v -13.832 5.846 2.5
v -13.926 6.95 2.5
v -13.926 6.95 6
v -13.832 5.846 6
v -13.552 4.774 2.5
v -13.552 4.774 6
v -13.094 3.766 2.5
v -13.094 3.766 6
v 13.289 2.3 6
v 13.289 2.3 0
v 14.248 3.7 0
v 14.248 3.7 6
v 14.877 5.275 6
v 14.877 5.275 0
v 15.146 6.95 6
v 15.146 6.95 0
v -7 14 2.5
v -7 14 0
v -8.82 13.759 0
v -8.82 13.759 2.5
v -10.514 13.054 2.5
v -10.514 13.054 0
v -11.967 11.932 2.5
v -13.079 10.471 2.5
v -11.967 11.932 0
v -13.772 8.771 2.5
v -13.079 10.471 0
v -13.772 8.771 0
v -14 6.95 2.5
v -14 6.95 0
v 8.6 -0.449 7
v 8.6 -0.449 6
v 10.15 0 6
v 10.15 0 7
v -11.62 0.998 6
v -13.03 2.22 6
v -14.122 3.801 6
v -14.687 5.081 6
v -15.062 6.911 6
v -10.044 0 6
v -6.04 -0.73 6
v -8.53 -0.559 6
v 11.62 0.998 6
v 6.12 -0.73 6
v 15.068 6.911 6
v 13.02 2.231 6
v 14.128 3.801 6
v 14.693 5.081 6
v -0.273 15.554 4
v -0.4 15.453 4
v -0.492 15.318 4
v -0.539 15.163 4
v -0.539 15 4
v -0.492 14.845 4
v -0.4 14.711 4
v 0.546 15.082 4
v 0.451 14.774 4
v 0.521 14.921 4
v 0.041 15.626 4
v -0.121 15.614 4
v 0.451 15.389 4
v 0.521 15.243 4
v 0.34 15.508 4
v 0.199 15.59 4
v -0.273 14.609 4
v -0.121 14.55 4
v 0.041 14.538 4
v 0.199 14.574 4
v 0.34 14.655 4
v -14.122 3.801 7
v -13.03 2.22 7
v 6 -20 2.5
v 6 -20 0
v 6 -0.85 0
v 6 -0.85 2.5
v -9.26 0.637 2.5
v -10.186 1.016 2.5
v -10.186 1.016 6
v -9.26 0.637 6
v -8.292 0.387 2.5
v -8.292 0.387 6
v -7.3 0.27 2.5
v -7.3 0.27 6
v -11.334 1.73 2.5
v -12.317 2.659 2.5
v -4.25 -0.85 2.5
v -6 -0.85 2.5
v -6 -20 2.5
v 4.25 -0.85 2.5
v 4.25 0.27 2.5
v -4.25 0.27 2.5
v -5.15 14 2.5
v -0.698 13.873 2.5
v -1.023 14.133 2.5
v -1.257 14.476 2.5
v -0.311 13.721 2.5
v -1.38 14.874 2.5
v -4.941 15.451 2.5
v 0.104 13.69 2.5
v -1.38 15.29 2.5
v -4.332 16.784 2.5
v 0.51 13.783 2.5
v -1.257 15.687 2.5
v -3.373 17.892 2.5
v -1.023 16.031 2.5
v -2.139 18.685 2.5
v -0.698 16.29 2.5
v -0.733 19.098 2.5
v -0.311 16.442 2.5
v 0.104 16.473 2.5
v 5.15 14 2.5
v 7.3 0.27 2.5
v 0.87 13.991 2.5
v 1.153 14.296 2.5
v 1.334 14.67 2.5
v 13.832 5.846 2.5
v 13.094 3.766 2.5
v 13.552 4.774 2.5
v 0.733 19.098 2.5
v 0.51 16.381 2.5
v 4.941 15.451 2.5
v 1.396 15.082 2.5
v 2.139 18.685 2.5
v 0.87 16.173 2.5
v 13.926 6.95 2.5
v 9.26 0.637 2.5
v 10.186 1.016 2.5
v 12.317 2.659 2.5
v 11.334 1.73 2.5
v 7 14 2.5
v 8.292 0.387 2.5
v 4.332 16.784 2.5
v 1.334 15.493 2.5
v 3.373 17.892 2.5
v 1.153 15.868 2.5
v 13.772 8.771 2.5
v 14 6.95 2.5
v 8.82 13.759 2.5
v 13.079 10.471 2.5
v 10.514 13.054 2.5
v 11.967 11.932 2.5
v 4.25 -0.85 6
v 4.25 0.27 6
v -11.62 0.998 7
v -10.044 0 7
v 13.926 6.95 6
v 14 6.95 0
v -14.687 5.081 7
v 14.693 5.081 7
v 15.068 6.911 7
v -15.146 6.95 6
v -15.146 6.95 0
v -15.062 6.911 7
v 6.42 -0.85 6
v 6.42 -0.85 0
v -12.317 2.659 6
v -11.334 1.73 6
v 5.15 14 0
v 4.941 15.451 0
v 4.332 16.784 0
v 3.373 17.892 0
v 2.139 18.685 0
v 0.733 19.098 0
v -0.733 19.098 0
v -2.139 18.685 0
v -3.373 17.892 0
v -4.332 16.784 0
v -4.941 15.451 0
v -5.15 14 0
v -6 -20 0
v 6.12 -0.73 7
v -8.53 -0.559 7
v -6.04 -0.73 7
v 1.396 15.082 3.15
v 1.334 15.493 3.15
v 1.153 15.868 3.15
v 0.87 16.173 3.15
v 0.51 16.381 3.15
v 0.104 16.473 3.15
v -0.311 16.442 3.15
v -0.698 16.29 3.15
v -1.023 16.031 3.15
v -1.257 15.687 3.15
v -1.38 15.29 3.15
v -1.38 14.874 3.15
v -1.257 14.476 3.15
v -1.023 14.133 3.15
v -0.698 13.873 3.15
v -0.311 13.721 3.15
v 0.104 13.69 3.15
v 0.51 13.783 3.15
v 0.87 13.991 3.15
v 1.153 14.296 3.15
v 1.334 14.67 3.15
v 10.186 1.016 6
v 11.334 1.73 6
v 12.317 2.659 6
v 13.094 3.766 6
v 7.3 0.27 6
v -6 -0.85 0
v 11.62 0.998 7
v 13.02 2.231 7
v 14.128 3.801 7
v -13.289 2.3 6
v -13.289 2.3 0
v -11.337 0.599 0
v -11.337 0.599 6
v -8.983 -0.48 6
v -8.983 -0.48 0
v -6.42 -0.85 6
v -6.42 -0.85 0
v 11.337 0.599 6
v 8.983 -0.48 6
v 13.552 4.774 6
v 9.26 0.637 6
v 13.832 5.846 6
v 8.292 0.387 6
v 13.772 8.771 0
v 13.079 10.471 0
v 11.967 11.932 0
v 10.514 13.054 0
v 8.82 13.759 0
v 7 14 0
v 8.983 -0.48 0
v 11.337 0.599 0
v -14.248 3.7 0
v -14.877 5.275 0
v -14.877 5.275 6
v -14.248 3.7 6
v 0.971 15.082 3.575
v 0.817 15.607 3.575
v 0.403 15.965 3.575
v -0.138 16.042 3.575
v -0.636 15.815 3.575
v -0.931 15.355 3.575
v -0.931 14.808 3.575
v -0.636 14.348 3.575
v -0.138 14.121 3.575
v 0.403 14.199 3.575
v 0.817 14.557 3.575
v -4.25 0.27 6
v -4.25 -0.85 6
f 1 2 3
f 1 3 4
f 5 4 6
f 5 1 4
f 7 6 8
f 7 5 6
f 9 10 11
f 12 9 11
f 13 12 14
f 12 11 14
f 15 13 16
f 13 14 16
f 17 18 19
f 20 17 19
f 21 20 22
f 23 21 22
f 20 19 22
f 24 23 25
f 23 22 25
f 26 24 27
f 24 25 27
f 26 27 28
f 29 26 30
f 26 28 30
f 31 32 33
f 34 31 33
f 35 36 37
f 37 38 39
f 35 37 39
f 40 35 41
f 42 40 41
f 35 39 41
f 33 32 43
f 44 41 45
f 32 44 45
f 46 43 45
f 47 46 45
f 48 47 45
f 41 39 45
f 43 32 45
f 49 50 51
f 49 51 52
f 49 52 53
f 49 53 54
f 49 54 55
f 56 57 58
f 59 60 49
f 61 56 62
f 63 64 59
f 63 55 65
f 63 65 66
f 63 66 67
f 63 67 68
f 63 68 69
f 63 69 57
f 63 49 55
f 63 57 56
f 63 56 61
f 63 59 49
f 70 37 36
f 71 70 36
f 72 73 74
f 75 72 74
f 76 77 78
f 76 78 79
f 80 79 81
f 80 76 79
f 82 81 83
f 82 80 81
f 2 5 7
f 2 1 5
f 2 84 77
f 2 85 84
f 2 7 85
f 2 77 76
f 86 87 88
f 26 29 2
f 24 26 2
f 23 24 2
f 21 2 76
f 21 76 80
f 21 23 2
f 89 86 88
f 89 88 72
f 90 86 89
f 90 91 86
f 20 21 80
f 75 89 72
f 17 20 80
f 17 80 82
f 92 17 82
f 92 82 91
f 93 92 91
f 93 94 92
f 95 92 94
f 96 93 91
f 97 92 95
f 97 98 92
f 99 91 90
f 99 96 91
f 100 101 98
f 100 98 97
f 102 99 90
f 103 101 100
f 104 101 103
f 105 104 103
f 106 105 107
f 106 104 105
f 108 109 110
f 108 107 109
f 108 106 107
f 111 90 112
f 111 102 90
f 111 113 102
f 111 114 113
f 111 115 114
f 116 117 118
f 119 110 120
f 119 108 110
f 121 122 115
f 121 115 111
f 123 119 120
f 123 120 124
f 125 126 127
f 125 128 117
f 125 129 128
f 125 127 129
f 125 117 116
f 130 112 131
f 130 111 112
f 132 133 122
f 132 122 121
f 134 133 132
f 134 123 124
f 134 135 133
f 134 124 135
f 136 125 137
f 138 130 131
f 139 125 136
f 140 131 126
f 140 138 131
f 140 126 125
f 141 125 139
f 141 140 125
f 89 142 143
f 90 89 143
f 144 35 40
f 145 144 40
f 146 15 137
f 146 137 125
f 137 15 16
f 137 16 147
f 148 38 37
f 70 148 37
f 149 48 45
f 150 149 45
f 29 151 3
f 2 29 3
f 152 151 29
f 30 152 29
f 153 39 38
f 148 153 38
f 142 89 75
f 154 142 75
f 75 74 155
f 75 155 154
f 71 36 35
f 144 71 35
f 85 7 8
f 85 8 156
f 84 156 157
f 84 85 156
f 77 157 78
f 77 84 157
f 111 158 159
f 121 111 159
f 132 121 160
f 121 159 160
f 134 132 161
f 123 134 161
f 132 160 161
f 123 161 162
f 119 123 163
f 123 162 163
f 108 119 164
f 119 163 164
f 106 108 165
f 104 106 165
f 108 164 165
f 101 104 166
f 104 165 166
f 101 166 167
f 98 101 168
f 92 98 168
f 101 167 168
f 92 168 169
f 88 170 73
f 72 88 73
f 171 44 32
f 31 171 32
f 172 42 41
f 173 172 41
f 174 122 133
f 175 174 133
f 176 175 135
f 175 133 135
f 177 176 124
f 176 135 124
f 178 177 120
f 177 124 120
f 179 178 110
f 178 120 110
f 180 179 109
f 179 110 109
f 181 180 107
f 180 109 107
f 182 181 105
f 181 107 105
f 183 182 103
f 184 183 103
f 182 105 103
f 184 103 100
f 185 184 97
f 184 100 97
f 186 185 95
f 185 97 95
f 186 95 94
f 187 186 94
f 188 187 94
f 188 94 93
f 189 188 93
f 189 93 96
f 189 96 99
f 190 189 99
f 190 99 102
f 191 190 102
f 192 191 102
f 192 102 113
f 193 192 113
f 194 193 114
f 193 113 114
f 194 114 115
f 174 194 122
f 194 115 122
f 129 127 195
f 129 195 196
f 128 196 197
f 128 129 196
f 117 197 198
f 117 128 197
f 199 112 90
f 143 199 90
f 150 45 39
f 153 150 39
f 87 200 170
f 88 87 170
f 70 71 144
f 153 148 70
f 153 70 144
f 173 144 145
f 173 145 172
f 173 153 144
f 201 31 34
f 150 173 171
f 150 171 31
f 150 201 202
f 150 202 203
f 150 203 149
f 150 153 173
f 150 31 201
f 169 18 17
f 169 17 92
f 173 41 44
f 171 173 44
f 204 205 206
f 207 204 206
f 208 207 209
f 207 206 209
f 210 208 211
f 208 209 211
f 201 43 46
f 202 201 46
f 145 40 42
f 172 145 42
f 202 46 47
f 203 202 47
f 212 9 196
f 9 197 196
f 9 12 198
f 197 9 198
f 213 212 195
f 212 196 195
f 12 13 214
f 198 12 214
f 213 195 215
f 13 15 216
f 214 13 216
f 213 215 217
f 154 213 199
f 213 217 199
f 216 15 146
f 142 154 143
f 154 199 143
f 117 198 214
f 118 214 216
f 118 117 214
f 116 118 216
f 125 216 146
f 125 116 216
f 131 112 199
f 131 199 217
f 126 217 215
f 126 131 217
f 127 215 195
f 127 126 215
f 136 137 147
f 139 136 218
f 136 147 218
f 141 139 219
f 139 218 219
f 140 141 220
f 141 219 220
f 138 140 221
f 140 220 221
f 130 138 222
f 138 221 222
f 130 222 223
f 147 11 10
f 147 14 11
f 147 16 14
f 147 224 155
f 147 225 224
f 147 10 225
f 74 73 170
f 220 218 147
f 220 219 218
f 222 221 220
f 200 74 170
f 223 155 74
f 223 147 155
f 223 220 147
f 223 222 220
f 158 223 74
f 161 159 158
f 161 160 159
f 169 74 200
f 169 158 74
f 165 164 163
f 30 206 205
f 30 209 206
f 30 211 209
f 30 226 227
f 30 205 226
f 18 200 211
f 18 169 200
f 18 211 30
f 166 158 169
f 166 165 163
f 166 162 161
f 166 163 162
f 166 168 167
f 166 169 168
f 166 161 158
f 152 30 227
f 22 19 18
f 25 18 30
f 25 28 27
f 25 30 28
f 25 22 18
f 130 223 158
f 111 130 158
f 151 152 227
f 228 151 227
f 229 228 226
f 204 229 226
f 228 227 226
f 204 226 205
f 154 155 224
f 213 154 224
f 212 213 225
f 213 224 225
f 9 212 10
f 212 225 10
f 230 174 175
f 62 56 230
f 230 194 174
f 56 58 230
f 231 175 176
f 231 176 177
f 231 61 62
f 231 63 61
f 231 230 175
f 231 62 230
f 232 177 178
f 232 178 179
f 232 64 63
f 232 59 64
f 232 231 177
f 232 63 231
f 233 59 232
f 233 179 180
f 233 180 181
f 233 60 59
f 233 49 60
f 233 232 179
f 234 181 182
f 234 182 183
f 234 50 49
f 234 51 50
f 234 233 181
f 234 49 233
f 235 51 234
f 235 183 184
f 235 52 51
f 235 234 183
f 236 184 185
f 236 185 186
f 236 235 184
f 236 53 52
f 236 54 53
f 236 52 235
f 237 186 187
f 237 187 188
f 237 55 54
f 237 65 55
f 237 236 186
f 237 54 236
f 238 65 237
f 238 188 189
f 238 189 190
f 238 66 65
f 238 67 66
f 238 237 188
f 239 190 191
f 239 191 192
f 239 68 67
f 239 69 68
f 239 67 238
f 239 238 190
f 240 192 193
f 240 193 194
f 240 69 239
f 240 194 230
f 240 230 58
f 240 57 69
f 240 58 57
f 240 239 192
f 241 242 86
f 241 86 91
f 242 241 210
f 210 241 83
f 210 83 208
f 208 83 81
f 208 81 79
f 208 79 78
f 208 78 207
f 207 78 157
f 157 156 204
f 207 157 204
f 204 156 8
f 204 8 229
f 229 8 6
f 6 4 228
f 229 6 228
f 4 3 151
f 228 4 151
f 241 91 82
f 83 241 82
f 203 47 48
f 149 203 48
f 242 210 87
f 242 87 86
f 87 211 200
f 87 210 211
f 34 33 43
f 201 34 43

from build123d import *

# Parameters (mm, degrees)
PAD001_DEPTH    = 2.5
PAD_DEPTH       = 6
SKETCH008_W     = 12.02
SKETCH008_H     = 3.5
POCKET001_DEPTH = 8.5
SKETCH009_R     = 1.395576
PAD003_DEPTH    = 1.5
CHAMFER_SIZE    = 0.85
PAD002_DEPTH    = 1


with BuildPart() as body_key_holder_id_badge:
    # Sketch → Pad001 (new body)
    with BuildSketch(Plane.XY):
        with BuildLine():
            Line((-6, 0), (-6, -20))
            Line((-6, -20), (6, -20))
            Line((6, -20), (6, 0))
            Line((6, 0), (7, 0))
            ThreePointArc((7, 0), (14, 7.000002), (6.999995, 14))
            Line((6.999995, 14), (5.15, 14))
            ThreePointArc((5.15, 14), (0, 19.15), (-5.15, 14))
            Line((-6.999972, 14), (-5.15, 14))
            ThreePointArc((-6.999972, 14), (-14, 7.000014), (-7, 0))
            Line((-6, 0), (-7, 0))
        make_face()
    extrude(amount=PAD001_DEPTH)

    # Sketch007 → Pad (join)
    with BuildSketch(Plane.XY):
        with BuildLine():
            Line((-4.26, -0.85), (-6.42, -0.85))
            ThreePointArc((-13.289279, 2.3), (-10.198541, -0.024954), (-6.42, -0.85))
            ThreePointArc((-15.146324, 6.95), (-14.606061, 4.469943), (-13.289279, 2.3))
            Line((-15.146324, 6.95), (-13.926324, 6.95))
            ThreePointArc((-13.926324, 6.95), (-13.714749, 5.304281), (-13.093783, 3.765595))
            ThreePointArc((-13.093783, 3.765595), (-11.848941, 2.169462), (-10.185853, 1.015595))
            ThreePointArc((-10.185853, 1.015595), (-8.780661, 0.49594), (-7.299596, 0.27))
            Line((-7.299596, 0.27), (-4.325, 0.27))
            Line((-4.325, 0.27), (4.325, 0.27))
            Line((7.299596, 0.27), (4.325, 0.27))
            ThreePointArc((7.299596, 0.27), (8.780661, 0.49594), (10.185853, 1.015595))
            ThreePointArc((10.185853, 1.015595), (11.848941, 2.169462), (13.093783, 3.765595))
            ThreePointArc((13.093783, 3.765595), (13.714749, 5.304281), (13.926324, 6.95))
            Line((15.146324, 6.95), (13.926324, 6.95))
            ThreePointArc((13.289279, 2.3), (14.606061, 4.469943), (15.146324, 6.95))
            ThreePointArc((6.42, -0.85), (10.198541, -0.024954), (13.289279, 2.3))
            Line((4.26, -0.85), (6.42, -0.85))
            Line((-4.26, -0.85), (4.26, -0.85))
        make_face()
    extrude(amount=PAD_DEPTH)

    # Sketch008 (on Face31 of Pad) → Pocket001 (cut)
    with BuildSketch(Plane.YZ.offset(4.25)):
        with Locations((0, 4.25)):
            Rectangle(SKETCH008_W, SKETCH008_H)
    extrude(amount=-POCKET001_DEPTH, mode=Mode.SUBTRACT)

    # Sketch009 (on Face4 of Pocket001) → Pad003 (join)
    with BuildSketch(Plane.XY.offset(2.5)):
        with Locations((0, 15.081774)):
            Circle(SKETCH009_R)
    extrude(amount=PAD003_DEPTH)

    # Chamfer
    chamfer_edges = [body_key_holder_id_badge.edges().sort_by_distance(p)[0] for p in [
        (-1.395576, 15.081774, 4),
    ]]
    chamfer(chamfer_edges, length=CHAMFER_SIZE)


with BuildPart() as body_top:
    # Sketch005 → Pad002 (new body)
    with BuildSketch(Plane.XY.offset(6)):
        Polygon((-15.061801, 6.911447), (-14.686801, 5.081447), (-14.121801, 3.801447), (-13.03, 2.22), (-11.62, 0.998293), (-10.043905, 0), (-8.53, -0.558553), (-6.04, -0.73), (6.12, -0.73), (8.6, -0.448764), (10.15, 0), (11.62, 0.998293), (13.02, 2.231447), (14.128199, 3.801447), (14.693199, 5.081447), (15.068199, 6.911447), align=None)
    extrude(amount=PAD002_DEPTH)


solid = Compound([body_key_holder_id_badge.part, body_top.part])
